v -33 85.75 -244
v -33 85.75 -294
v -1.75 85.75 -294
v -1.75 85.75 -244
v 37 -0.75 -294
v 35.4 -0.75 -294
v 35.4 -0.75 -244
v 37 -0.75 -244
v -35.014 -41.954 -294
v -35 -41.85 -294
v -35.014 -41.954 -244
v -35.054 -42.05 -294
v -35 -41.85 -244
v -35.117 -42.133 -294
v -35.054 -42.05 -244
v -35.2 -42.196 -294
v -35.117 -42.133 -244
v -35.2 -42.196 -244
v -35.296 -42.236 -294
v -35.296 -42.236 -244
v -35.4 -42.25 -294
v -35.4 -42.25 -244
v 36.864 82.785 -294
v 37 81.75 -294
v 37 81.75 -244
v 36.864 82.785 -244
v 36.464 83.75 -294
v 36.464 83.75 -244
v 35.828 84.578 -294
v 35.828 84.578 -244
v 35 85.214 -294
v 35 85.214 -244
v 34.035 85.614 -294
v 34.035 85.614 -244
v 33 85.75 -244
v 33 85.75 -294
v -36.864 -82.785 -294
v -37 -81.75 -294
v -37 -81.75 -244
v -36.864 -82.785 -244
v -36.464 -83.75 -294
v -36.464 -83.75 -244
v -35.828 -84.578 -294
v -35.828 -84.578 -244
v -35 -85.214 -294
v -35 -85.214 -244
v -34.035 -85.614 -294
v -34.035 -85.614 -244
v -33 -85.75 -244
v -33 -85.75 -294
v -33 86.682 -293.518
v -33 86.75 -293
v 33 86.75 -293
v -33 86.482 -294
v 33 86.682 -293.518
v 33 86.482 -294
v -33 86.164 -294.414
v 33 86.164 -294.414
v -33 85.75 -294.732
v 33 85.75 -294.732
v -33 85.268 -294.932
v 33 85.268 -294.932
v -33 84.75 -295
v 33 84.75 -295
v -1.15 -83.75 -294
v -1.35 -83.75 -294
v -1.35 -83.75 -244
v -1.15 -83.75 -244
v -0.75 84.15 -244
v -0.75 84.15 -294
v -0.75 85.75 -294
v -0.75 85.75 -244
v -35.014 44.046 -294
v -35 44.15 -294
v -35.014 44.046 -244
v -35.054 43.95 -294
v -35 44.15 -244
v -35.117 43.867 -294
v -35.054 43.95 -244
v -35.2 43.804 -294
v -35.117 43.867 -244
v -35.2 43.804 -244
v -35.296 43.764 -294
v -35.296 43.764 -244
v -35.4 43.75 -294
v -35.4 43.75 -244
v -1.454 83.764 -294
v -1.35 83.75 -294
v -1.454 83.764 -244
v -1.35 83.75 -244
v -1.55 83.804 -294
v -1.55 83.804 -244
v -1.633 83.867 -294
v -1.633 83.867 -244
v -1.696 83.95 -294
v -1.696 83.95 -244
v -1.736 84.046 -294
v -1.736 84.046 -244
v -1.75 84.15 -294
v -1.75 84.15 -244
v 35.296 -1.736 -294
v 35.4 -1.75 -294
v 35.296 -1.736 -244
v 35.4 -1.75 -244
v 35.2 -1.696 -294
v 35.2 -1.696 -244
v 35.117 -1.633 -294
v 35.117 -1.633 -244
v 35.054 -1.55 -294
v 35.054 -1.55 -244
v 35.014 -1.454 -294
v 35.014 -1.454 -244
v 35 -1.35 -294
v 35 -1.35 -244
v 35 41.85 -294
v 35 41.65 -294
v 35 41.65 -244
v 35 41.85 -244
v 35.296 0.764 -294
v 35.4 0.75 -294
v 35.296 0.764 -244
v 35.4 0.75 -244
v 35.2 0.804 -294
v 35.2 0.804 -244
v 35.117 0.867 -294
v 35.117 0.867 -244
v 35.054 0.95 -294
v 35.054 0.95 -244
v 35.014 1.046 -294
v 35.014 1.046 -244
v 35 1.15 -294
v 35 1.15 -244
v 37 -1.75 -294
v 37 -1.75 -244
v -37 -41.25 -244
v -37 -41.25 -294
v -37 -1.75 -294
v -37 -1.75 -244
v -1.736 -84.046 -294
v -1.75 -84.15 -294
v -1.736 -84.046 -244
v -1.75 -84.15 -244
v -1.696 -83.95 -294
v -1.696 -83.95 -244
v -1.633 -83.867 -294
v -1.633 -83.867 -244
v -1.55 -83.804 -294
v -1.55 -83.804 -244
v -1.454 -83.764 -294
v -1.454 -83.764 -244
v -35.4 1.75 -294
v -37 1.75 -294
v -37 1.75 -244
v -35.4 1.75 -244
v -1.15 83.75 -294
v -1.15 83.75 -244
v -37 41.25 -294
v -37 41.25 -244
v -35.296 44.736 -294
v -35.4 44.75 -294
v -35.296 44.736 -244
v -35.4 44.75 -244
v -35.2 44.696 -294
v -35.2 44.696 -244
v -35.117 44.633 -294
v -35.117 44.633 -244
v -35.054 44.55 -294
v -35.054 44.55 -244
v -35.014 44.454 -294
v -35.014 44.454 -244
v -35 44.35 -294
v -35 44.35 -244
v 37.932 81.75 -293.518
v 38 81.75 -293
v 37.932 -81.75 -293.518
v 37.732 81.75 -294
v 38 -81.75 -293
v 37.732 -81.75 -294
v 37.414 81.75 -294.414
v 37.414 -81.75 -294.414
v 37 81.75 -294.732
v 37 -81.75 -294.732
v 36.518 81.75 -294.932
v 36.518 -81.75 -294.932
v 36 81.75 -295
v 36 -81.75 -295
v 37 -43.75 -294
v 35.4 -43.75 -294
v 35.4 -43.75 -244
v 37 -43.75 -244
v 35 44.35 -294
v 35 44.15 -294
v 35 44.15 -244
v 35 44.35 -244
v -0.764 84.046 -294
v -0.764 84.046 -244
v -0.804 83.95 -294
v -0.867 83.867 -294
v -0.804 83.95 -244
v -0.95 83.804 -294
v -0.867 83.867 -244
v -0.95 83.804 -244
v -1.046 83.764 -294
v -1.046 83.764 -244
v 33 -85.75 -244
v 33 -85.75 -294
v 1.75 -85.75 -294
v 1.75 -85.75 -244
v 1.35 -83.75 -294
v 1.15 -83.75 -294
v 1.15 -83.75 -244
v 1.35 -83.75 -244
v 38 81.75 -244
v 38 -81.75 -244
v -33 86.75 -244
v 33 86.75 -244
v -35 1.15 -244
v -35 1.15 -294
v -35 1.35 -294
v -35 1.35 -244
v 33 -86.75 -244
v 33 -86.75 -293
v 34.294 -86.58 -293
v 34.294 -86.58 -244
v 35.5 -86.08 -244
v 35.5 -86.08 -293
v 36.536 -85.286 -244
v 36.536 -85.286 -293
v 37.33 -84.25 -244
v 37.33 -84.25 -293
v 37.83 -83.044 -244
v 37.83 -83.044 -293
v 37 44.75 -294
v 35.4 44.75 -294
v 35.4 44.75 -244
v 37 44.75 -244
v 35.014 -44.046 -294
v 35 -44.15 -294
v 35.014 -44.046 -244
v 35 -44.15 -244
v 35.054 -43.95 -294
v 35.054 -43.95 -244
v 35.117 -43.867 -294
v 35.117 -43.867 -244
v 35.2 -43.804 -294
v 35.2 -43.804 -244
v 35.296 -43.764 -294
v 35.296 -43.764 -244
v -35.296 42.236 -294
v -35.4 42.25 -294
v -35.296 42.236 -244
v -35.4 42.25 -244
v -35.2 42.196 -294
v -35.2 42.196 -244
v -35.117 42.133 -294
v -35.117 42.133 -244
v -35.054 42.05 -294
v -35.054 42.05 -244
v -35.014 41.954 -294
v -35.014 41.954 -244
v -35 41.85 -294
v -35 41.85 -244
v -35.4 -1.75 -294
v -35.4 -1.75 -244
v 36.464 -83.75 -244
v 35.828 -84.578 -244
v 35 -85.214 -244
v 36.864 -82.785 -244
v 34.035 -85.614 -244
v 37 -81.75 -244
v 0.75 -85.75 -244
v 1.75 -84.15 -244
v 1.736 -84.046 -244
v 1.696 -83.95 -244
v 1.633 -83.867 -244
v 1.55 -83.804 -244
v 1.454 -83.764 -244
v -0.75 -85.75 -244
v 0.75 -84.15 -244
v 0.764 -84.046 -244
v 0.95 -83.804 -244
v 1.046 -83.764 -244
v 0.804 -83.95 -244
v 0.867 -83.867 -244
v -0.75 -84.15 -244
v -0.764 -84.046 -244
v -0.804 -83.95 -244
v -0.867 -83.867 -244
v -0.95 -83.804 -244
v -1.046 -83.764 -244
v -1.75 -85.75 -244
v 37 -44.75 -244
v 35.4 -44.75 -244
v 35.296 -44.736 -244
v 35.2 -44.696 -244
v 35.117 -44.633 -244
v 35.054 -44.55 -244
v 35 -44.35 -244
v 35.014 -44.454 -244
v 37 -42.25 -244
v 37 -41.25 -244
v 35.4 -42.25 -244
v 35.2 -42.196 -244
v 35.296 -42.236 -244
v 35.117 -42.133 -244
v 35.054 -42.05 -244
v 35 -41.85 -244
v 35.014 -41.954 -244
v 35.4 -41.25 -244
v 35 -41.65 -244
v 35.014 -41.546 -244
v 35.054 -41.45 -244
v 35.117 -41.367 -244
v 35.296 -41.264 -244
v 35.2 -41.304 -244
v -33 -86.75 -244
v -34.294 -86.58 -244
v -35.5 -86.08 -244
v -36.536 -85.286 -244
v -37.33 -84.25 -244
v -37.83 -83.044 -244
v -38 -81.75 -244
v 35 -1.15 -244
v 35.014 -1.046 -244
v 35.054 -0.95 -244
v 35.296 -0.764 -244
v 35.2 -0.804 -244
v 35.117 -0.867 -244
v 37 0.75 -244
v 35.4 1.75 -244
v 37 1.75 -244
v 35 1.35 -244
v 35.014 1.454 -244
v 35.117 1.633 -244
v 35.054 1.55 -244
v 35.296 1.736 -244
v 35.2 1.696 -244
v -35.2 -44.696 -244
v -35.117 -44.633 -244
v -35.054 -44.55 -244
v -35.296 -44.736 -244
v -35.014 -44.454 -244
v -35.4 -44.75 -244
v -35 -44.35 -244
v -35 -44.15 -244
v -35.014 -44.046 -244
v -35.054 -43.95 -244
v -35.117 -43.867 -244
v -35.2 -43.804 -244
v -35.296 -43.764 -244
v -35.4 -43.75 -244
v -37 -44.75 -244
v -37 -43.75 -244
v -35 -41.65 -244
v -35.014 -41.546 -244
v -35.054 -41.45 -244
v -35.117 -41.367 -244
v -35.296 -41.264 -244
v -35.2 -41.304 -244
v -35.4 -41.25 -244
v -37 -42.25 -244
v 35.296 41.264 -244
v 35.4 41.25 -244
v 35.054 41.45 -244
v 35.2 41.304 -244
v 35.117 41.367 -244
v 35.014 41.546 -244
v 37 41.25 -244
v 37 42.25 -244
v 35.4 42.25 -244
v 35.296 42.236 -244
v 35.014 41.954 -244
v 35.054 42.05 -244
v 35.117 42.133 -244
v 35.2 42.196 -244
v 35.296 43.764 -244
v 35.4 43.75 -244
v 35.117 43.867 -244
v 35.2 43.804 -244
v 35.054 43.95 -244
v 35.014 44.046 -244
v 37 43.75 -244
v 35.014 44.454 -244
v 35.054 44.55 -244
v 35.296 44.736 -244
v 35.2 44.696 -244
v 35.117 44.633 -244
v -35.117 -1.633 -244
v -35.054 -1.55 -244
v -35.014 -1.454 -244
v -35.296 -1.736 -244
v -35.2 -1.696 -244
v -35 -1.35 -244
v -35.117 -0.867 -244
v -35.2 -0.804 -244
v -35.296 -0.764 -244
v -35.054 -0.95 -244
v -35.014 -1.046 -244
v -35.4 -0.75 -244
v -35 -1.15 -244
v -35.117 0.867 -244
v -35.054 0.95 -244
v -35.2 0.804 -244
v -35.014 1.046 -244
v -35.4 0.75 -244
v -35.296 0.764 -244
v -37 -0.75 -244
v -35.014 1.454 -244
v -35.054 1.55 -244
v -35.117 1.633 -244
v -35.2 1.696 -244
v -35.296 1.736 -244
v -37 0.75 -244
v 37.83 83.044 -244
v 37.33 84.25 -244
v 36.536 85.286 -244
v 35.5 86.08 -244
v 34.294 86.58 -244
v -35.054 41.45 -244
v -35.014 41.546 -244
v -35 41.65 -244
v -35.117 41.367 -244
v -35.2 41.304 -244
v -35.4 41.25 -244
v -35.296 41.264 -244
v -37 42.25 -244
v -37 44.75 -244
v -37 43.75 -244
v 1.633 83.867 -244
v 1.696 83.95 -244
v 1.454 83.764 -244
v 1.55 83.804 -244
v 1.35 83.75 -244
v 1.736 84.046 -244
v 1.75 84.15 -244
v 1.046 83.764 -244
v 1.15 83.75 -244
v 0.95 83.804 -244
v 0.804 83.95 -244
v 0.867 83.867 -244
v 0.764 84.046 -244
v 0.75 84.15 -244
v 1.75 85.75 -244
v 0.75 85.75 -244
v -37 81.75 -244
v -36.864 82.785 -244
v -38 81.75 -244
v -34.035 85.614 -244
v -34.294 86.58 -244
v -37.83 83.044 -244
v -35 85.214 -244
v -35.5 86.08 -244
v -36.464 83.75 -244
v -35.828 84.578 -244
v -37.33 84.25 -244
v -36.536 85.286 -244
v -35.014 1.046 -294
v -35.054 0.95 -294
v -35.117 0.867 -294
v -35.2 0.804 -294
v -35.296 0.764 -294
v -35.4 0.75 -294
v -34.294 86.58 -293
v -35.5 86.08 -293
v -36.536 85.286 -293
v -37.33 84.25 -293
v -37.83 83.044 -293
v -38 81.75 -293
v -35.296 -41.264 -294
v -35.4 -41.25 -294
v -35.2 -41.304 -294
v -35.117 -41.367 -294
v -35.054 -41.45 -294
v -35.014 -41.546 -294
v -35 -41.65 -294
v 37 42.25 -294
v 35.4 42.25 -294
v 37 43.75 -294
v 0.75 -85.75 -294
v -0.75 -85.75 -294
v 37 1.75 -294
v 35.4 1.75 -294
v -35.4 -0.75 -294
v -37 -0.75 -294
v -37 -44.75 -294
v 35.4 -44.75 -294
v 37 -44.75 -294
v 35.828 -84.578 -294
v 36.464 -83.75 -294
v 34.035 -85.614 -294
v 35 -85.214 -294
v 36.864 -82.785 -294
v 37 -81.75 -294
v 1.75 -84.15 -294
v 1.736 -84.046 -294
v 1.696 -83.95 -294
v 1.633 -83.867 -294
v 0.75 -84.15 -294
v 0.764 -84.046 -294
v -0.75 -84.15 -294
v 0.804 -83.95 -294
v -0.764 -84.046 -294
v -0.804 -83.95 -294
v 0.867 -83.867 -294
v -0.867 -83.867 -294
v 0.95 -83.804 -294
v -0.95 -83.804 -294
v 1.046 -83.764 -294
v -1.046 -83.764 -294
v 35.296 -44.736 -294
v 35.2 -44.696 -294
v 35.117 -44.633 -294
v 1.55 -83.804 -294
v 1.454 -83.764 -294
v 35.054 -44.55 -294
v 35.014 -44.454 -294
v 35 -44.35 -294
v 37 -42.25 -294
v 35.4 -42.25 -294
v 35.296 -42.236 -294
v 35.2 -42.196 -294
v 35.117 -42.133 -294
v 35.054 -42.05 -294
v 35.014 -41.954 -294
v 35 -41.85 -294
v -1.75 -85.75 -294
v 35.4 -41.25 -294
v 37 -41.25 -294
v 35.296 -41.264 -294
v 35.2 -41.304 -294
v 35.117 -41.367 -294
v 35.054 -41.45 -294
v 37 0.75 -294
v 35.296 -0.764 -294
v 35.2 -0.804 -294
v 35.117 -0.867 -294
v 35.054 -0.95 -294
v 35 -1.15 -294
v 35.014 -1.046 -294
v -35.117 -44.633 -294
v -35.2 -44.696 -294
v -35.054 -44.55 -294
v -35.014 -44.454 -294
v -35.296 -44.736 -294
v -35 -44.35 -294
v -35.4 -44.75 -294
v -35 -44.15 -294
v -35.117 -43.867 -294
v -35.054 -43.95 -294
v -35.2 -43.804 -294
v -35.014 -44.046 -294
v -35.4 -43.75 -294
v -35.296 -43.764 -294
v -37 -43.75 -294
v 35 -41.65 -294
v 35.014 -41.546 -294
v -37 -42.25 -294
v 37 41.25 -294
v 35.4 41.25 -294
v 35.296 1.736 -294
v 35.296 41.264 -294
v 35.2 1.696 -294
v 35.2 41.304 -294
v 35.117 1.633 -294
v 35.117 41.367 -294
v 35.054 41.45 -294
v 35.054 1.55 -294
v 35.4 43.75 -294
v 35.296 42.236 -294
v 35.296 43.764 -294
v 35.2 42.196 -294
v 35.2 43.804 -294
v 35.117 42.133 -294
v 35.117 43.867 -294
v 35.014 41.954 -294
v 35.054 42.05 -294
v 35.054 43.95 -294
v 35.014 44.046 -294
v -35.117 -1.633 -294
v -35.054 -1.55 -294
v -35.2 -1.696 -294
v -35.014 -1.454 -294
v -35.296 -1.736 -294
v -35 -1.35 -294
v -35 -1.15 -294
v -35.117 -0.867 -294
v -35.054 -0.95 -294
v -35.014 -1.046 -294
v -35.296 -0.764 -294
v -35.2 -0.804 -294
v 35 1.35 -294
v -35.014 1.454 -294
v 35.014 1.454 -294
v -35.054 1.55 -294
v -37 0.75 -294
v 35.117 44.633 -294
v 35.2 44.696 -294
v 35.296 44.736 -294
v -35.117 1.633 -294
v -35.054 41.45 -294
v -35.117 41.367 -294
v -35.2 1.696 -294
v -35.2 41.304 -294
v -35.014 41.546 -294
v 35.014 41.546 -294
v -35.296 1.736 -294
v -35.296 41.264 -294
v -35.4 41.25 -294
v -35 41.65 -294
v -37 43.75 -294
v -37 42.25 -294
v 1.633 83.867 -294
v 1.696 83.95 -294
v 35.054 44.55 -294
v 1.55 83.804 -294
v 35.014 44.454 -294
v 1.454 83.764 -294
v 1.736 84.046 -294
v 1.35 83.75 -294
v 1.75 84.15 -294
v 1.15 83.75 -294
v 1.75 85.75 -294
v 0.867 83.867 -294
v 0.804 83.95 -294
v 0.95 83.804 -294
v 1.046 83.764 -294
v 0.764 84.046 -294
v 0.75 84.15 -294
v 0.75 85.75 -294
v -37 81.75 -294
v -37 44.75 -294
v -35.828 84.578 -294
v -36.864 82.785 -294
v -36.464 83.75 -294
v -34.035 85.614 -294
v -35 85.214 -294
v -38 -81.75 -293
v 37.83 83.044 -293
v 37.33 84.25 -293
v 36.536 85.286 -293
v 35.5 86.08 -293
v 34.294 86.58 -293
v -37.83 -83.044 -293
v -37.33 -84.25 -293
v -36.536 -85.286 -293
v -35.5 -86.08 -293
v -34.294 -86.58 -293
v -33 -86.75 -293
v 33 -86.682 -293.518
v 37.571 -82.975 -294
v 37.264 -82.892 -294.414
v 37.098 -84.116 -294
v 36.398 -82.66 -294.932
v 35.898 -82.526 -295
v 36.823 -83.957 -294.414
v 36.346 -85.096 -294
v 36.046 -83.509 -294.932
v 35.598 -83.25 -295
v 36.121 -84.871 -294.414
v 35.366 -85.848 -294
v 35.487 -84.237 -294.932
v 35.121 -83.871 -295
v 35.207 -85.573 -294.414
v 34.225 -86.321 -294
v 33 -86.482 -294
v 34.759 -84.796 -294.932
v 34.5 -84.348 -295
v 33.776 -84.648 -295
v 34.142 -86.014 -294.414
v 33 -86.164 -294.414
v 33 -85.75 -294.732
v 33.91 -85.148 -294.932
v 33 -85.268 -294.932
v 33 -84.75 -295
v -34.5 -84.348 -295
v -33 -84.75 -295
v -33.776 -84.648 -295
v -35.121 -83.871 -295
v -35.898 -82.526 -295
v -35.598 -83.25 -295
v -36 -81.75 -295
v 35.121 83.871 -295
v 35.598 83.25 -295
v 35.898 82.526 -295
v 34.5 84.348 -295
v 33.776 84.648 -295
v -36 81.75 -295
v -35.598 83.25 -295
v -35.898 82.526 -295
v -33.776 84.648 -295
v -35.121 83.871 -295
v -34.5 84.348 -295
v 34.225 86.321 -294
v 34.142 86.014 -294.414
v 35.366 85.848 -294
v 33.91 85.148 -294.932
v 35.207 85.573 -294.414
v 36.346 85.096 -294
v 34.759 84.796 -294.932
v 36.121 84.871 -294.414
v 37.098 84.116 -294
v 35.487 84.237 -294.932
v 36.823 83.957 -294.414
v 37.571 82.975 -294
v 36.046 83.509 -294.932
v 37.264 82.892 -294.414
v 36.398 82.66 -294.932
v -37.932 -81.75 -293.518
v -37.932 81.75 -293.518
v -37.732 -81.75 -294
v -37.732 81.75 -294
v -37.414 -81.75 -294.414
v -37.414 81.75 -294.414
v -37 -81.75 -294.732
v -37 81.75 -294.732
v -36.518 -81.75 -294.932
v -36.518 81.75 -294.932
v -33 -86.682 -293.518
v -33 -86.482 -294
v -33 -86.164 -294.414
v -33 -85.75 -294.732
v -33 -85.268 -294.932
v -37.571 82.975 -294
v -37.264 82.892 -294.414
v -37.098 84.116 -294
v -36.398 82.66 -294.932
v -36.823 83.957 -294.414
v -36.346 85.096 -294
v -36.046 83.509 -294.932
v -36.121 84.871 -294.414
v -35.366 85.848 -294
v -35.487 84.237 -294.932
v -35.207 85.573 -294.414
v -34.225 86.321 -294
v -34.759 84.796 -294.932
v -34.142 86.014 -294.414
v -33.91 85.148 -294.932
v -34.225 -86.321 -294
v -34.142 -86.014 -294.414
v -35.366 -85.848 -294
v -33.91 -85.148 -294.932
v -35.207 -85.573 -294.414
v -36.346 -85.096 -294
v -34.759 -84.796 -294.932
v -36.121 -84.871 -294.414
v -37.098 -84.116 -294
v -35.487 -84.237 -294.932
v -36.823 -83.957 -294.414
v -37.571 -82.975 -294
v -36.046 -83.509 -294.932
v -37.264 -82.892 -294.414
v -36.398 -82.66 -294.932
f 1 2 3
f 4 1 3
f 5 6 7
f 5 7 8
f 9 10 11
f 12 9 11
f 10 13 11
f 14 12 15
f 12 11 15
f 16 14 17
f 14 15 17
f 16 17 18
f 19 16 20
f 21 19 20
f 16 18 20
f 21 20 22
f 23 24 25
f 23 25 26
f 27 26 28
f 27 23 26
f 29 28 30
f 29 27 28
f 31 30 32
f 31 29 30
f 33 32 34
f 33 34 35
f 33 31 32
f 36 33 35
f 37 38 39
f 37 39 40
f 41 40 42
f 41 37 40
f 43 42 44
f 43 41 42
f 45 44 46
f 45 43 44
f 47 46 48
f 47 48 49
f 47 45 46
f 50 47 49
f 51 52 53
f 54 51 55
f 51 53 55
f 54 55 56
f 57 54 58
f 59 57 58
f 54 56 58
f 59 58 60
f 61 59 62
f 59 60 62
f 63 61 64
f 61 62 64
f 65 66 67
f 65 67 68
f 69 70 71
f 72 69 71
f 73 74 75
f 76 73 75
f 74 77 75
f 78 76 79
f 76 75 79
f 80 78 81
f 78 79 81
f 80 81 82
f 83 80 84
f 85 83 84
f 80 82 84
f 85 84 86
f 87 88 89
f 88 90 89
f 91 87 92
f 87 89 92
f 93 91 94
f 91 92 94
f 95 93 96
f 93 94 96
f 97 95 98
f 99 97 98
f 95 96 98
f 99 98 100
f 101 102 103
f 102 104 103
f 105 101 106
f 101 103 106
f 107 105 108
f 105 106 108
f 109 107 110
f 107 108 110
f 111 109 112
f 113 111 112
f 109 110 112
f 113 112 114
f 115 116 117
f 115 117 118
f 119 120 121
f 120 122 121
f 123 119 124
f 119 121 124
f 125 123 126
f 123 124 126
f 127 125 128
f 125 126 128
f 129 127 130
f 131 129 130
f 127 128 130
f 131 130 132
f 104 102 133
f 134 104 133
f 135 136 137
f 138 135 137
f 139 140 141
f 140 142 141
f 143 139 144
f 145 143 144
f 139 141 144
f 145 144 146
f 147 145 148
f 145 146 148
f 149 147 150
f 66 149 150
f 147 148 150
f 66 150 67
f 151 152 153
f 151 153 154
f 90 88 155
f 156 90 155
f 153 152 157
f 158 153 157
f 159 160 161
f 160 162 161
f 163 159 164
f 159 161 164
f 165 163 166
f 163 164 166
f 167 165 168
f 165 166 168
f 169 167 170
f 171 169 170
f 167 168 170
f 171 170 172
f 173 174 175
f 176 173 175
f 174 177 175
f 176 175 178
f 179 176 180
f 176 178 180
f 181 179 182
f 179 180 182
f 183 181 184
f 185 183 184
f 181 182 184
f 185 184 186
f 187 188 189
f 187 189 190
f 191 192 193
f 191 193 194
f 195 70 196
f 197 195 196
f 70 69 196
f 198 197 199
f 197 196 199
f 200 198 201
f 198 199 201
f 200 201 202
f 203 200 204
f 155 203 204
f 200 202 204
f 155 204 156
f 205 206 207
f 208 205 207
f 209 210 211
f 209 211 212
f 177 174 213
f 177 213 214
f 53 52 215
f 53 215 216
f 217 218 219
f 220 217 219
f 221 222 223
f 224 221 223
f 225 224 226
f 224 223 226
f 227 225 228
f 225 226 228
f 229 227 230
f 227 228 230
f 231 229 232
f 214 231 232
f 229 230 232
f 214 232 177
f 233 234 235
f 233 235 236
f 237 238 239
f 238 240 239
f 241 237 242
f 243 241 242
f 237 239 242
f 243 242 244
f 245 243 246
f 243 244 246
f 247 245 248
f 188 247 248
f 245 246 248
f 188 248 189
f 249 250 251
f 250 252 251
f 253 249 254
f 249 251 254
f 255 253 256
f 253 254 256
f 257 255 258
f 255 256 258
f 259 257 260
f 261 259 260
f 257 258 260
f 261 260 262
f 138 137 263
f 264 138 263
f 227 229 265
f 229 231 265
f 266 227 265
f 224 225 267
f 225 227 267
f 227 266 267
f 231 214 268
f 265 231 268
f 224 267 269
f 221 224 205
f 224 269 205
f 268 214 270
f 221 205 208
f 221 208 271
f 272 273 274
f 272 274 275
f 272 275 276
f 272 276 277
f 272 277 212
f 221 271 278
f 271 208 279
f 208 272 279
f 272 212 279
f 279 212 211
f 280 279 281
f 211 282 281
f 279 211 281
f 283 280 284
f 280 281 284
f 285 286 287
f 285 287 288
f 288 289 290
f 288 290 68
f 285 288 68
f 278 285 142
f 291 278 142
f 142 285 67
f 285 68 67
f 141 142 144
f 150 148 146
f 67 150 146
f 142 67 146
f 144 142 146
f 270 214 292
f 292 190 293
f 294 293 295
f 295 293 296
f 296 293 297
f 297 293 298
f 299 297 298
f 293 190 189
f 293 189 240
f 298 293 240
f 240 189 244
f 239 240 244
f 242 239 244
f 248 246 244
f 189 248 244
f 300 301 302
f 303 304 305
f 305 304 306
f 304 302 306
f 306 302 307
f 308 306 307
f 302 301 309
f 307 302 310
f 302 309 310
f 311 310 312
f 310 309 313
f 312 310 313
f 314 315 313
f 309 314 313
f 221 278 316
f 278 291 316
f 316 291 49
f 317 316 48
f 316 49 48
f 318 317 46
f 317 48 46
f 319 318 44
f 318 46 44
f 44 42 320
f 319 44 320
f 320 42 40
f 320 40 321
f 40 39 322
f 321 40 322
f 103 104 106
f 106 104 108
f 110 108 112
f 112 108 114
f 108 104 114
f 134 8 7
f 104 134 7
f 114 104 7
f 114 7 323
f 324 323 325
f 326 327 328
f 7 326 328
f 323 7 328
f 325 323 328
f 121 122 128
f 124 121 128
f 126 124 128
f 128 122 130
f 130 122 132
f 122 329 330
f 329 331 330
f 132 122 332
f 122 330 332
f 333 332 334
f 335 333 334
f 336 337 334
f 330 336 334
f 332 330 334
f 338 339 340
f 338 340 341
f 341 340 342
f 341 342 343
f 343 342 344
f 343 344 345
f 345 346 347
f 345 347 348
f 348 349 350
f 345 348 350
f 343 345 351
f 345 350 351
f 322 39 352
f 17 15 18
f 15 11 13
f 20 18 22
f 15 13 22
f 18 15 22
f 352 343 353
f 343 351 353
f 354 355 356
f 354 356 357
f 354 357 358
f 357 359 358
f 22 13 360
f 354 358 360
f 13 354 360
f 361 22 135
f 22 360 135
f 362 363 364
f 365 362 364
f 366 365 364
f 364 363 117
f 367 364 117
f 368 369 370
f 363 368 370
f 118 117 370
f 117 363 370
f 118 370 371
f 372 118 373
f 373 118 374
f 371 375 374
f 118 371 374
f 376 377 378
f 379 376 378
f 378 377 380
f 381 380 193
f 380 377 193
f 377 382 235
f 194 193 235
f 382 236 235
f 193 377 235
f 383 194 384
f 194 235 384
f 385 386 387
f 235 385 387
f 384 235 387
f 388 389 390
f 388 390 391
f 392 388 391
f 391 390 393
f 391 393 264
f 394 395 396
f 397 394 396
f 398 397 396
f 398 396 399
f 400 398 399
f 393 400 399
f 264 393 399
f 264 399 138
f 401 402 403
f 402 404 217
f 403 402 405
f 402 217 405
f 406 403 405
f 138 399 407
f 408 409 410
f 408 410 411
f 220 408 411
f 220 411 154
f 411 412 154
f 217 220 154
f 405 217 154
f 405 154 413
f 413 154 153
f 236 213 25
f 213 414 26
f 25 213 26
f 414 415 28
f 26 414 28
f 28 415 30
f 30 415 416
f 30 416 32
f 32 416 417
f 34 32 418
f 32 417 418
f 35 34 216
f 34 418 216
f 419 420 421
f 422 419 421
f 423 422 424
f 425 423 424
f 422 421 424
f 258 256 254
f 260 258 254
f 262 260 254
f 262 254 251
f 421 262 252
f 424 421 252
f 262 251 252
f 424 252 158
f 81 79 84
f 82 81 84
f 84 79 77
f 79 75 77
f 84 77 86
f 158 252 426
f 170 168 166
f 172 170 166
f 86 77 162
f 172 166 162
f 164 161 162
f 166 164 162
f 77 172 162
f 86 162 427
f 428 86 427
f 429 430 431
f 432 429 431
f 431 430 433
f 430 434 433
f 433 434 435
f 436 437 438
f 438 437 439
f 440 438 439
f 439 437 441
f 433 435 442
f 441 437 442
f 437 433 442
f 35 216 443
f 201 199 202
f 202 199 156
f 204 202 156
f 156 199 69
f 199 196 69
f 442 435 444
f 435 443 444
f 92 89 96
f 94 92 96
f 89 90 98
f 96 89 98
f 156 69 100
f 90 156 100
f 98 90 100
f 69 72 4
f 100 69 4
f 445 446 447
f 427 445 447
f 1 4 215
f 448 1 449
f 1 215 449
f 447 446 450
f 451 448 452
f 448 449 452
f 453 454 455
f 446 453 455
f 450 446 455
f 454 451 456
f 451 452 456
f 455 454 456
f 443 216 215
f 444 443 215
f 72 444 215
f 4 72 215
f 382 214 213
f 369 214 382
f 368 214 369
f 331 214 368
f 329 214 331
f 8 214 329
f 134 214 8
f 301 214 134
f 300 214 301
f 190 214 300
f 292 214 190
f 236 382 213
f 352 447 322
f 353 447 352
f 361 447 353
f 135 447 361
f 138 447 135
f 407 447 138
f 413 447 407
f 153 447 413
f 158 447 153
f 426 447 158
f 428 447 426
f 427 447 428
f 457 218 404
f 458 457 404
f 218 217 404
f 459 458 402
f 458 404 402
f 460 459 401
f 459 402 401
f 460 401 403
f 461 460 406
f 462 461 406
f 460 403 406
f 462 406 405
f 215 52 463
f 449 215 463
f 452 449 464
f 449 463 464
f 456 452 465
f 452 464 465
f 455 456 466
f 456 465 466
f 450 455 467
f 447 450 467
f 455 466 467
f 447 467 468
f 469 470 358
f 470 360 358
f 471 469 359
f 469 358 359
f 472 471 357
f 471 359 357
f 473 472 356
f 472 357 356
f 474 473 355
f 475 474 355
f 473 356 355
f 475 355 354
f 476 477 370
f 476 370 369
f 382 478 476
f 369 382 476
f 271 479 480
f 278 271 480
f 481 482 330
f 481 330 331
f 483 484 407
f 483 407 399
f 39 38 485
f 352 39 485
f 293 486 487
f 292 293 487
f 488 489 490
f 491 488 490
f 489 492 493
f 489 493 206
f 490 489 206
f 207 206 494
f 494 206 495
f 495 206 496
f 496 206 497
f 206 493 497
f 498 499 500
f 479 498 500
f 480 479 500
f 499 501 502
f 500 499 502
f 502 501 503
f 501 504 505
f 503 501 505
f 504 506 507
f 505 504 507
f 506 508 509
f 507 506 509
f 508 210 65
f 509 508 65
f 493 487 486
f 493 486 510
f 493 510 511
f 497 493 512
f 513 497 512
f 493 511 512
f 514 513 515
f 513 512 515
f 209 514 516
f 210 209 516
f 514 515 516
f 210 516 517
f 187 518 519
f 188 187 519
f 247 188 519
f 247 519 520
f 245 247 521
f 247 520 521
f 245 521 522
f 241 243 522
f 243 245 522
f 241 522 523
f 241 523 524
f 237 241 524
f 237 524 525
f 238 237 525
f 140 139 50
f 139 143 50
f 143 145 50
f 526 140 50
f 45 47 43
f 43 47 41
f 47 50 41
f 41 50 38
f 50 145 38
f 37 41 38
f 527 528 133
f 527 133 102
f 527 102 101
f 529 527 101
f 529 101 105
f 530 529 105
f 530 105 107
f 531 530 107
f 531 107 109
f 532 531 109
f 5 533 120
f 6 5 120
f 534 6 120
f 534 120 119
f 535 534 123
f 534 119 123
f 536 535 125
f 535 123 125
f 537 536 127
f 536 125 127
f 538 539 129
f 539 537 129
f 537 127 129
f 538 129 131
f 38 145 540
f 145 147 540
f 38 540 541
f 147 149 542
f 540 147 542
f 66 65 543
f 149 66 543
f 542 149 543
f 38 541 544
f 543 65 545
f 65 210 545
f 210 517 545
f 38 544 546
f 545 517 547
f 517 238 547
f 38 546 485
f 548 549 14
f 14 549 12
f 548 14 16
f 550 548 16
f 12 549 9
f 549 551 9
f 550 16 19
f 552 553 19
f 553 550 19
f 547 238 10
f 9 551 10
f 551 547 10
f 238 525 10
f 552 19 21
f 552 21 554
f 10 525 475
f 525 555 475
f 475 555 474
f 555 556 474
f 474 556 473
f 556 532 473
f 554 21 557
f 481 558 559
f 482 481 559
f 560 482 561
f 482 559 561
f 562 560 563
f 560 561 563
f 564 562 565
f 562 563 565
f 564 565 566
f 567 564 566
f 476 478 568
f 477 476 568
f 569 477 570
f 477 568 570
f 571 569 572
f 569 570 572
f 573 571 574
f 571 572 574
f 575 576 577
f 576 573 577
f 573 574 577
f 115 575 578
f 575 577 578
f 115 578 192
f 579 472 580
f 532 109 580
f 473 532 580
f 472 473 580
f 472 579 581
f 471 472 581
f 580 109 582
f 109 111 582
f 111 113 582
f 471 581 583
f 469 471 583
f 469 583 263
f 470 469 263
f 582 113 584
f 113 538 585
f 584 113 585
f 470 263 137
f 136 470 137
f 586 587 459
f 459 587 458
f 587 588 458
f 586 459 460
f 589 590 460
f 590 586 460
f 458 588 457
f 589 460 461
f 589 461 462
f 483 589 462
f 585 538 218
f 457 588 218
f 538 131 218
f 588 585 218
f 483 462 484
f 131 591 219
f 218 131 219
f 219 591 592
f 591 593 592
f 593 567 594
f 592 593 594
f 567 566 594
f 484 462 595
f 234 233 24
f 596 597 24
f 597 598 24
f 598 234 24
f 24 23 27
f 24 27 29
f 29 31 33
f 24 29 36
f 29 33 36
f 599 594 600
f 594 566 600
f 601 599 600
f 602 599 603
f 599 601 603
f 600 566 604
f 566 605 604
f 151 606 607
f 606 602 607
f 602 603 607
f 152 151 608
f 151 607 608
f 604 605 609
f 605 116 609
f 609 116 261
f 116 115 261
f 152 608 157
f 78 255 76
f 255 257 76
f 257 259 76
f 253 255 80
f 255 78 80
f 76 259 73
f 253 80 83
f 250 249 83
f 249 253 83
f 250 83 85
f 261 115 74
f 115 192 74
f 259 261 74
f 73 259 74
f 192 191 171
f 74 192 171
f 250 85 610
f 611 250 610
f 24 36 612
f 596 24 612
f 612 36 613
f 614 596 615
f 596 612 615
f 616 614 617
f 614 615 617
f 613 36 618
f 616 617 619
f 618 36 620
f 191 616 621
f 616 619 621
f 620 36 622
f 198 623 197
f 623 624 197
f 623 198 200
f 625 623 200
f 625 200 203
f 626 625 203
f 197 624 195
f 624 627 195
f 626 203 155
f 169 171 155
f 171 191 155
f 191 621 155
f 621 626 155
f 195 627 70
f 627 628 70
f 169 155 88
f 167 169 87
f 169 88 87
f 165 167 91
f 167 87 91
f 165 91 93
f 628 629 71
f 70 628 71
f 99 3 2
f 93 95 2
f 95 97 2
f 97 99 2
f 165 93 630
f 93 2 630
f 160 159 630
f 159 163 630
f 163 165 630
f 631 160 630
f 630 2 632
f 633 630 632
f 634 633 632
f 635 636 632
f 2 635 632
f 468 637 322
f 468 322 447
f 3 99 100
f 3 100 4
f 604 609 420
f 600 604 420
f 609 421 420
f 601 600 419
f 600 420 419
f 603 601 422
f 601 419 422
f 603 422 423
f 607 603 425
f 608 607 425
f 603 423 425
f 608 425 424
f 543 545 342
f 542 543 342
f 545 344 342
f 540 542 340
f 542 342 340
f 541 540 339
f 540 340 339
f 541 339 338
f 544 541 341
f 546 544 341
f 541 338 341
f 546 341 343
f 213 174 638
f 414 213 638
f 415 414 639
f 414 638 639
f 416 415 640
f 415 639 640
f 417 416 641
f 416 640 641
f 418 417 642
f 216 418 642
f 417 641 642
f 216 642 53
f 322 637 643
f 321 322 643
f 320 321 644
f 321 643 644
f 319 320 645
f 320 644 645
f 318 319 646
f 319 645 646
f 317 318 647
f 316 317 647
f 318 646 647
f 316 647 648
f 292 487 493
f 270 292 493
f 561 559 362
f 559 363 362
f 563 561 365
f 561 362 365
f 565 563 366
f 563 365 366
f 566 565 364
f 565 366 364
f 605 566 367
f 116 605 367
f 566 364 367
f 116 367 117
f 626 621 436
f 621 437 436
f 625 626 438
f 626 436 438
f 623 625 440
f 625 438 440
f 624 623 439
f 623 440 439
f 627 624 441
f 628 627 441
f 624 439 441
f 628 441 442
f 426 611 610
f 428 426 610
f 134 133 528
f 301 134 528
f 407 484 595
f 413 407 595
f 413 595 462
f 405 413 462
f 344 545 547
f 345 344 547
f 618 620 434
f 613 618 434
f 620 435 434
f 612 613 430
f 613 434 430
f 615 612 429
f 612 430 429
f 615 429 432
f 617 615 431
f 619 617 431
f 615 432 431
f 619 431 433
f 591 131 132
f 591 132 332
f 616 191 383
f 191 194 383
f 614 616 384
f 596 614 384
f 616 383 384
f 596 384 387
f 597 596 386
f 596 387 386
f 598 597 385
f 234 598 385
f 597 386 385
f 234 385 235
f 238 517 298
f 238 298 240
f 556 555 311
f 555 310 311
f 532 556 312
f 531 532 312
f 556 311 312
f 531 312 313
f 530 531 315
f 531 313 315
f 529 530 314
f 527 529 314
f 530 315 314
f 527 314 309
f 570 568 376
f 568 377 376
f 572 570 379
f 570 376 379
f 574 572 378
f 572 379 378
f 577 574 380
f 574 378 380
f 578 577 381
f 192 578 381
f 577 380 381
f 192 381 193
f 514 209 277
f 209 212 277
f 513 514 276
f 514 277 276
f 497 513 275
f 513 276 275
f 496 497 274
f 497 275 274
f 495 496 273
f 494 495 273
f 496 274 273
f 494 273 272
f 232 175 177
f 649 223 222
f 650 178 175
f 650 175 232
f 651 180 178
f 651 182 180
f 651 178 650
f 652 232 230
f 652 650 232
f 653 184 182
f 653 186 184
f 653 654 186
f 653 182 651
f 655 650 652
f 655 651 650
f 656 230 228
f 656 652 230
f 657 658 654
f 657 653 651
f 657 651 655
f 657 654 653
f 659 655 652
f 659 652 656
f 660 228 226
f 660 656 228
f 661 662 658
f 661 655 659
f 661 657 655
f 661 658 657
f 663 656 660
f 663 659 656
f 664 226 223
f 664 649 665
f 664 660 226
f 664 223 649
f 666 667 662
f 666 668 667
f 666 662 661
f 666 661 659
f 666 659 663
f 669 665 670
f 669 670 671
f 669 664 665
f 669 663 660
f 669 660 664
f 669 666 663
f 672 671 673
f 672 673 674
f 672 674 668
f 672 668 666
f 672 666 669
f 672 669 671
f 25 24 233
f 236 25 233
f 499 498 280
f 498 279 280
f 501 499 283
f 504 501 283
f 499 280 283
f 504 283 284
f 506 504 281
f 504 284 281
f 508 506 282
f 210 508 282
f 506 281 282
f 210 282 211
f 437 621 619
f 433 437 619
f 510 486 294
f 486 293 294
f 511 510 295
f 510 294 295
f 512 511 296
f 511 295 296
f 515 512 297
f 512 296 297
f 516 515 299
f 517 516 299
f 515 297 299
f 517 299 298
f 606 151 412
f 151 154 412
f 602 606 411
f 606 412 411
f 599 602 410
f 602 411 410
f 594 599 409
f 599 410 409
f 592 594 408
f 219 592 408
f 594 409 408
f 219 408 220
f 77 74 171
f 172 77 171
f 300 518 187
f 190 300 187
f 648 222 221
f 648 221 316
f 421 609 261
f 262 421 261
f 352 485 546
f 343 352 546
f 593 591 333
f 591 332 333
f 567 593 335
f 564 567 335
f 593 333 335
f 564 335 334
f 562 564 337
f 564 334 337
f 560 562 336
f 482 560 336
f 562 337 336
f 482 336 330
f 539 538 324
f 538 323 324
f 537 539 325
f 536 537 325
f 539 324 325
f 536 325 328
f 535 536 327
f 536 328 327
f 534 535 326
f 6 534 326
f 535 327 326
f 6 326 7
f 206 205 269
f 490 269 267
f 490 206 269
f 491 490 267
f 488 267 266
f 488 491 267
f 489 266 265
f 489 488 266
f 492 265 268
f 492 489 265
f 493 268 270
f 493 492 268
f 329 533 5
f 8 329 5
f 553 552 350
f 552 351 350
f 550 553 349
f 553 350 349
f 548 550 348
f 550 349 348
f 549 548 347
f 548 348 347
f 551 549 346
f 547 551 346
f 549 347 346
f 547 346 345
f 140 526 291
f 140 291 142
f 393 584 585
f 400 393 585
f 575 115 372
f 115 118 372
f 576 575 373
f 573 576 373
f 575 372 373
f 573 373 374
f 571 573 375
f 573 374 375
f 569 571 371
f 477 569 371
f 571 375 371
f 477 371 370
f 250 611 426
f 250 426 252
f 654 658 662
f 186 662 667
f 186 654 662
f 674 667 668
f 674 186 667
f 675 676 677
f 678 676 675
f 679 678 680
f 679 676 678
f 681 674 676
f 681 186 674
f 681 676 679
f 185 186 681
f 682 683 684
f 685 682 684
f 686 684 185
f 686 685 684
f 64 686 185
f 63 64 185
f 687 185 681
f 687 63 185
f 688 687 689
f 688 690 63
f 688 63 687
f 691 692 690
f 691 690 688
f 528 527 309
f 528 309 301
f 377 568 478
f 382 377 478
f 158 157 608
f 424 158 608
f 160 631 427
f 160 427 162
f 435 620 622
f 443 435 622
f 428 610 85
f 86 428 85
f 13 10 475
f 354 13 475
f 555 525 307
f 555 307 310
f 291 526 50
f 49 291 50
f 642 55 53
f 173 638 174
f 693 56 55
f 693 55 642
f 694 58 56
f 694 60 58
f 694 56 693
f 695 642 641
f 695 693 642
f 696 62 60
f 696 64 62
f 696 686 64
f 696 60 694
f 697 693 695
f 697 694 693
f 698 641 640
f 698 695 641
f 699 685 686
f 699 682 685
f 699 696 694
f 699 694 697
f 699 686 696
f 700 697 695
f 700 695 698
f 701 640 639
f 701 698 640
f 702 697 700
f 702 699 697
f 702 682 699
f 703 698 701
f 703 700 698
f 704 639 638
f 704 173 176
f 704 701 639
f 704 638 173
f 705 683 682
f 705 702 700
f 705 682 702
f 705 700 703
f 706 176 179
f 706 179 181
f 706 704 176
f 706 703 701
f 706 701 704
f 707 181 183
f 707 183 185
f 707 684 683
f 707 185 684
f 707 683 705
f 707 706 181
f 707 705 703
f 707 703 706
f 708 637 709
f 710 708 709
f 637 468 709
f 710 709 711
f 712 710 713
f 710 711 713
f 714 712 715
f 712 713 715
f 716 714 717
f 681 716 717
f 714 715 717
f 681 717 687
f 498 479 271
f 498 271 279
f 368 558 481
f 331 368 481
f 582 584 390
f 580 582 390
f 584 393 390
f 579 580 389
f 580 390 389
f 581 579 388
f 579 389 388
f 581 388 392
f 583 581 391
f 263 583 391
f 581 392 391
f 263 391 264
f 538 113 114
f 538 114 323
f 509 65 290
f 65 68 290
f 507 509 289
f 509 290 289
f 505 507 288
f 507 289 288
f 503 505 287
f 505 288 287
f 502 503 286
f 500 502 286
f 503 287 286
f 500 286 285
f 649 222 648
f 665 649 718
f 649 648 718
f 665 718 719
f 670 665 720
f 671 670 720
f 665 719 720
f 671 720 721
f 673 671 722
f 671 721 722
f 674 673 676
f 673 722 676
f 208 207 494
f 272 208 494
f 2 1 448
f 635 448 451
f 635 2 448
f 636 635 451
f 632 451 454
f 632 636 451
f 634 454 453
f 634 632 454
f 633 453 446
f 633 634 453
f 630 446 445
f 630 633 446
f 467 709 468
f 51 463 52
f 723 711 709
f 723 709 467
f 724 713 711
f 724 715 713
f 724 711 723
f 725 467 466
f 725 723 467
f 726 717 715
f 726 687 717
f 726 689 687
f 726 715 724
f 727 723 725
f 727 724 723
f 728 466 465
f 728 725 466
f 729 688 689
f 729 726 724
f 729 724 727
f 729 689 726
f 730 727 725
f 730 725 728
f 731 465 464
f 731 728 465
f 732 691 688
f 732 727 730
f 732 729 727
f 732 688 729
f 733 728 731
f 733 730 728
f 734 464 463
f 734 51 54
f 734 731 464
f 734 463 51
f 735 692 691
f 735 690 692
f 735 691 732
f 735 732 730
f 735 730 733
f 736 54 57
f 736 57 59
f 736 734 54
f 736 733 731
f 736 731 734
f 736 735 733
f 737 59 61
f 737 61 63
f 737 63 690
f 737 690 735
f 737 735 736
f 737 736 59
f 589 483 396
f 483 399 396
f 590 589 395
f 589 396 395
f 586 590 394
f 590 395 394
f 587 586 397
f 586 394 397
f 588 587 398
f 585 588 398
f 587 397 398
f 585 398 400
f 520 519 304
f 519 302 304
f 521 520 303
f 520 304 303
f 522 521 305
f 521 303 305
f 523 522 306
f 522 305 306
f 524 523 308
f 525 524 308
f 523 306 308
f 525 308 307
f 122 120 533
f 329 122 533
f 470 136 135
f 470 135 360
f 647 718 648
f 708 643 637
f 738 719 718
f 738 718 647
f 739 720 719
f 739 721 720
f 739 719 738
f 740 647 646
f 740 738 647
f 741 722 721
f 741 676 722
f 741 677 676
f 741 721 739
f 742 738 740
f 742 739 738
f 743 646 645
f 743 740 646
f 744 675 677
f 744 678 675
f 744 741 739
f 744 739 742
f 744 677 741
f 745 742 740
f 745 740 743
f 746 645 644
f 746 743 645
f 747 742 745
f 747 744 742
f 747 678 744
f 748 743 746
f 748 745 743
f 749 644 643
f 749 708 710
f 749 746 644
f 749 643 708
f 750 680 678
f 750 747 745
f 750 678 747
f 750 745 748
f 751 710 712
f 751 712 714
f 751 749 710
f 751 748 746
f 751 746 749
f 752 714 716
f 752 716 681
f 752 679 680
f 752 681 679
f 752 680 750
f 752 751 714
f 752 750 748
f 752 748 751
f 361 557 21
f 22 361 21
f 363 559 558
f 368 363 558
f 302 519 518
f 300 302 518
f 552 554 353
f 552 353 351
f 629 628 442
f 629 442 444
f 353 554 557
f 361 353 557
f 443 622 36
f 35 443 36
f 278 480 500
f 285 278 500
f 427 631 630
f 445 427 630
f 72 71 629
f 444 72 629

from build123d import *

# Parameters (mm, degrees)
PAD_DEPTH     = 51
THICKNESS_T   = -1
SKETCH001_W   = 2
SKETCH001_H   = 1
SKETCH001_W_2 = 1
SKETCH001_H_2 = 2
PAD001_DEPTH  = 50
FILLET_R      = 2
FILLET003_R   = 0.4


with BuildPart() as part:
    # Sketch → Pad (new body)
    with BuildSketch(Plane.XY):
        with BuildLine():
            Line((-33, 86.75), (33, 86.75))
            ThreePointArc((38, 81.75), (36.535534, 85.285534), (33, 86.75))
            Line((38, 81.75), (38, -81.75))
            ThreePointArc((33, -86.75), (36.535534, -85.285534), (38, -81.75))
            Line((33, -86.75), (-33, -86.75))
            ThreePointArc((-38, -81.75), (-36.535534, -85.285534), (-33, -86.75))
            Line((-38, -81.75), (-38, 81.75))
            ThreePointArc((-33, 86.75), (-36.535534, 85.285534), (-38, 81.75))
        make_face()
    extrude(amount=PAD_DEPTH)

    # Thickness
    thickness_openings = [part.faces().sort_by_distance(p)[0] for p in [
        (0, 0, 51),
    ]]
    offset(amount=THICKNESS_T, openings=thickness_openings)

    # Sketch001 (on Face19 of Thickness) → Pad001 (join)
    with BuildSketch(Plane.XY.offset(1)):
        with Locations((-36, 44.25)):
            Rectangle(SKETCH001_W, SKETCH001_H)
        with Locations((-36, 41.75)):
            Rectangle(SKETCH001_W, SKETCH001_H)
        with Locations((36, 44.25)):
            Rectangle(SKETCH001_W, SKETCH001_H)
        with Locations((36, 41.75)):
            Rectangle(SKETCH001_W, SKETCH001_H)
        with Locations((-36, -41.75)):
            Rectangle(SKETCH001_W, SKETCH001_H)
        with Locations((-36, -44.25)):
            Rectangle(SKETCH001_W, SKETCH001_H)
        with Locations((-36, 1.25)):
            Rectangle(SKETCH001_W, SKETCH001_H)
        with Locations((-36, -1.25)):
            Rectangle(SKETCH001_W, SKETCH001_H)
        with Locations((36, 1.25)):
            Rectangle(SKETCH001_W, SKETCH001_H)
        with Locations((36, -1.25)):
            Rectangle(SKETCH001_W, SKETCH001_H)
        with Locations((36, -41.75)):
            Rectangle(SKETCH001_W, SKETCH001_H)
        with Locations((36, -44.25)):
            Rectangle(SKETCH001_W, SKETCH001_H)
        with Locations((-1.25, -84.75)):
            Rectangle(SKETCH001_W_2, SKETCH001_H_2)
        with Locations((1.25, -84.75)):
            Rectangle(SKETCH001_W_2, SKETCH001_H_2)
        with Locations((-1.25, 84.75)):
            Rectangle(SKETCH001_W_2, SKETCH001_H_2)
        with Locations((1.25, 84.75)):
            Rectangle(SKETCH001_W_2, SKETCH001_H_2)
    extrude(amount=PAD001_DEPTH)

    # Fillet
    fillet_edges = [part.edges().sort_by_distance(p)[0] for p in [
        (0, 86.75, 0),
    ]]
    fillet(fillet_edges, radius=FILLET_R)

    # Fillet003
    fillet003_edges = [part.edges().sort_by_distance(p)[0] for p in [
        (1.75, -83.75, 26),
        (0.75, -83.75, 26),
        (-0.75, -83.75, 26),
        (-1.75, -83.75, 26),
        (35, 44.75, 26),
        (35, 43.75, 26),
        (35, 42.25, 26),
        (35, 41.25, 26),
        (35, 1.75, 26),
        (35, 0.75, 26),
        (35, -0.75, 26),
        (35, -1.75, 26),
        (35, -41.25, 26),
        (35, -42.25, 26),
        (35, -43.75, 26),
        (35, -44.75, 26),
        (-35, 44.75, 26),
        (-35, 43.75, 26),
        (-35, 42.25, 26),
        (-35, 41.25, 26),
        (-35, 1.75, 26),
        (-35, 0.75, 26),
        (-35, -0.75, 26),
        (-35, -1.75, 26),
        (-35, -41.25, 26),
        (-35, -42.25, 26),
        (-35, -43.75, 26),
        (-35, -44.75, 26),
        (1.75, 83.75, 26),
        (0.75, 83.75, 26),
        (-0.75, 83.75, 26),
        (-1.75, 83.75, 26),
    ]]
    fillet(fillet003_edges, radius=FILLET003_R)


with BuildPart() as part_1:
    # Body placement: moved
    add(part.part.moved(Location((0, 0, -295))))


solid = part_1.part
